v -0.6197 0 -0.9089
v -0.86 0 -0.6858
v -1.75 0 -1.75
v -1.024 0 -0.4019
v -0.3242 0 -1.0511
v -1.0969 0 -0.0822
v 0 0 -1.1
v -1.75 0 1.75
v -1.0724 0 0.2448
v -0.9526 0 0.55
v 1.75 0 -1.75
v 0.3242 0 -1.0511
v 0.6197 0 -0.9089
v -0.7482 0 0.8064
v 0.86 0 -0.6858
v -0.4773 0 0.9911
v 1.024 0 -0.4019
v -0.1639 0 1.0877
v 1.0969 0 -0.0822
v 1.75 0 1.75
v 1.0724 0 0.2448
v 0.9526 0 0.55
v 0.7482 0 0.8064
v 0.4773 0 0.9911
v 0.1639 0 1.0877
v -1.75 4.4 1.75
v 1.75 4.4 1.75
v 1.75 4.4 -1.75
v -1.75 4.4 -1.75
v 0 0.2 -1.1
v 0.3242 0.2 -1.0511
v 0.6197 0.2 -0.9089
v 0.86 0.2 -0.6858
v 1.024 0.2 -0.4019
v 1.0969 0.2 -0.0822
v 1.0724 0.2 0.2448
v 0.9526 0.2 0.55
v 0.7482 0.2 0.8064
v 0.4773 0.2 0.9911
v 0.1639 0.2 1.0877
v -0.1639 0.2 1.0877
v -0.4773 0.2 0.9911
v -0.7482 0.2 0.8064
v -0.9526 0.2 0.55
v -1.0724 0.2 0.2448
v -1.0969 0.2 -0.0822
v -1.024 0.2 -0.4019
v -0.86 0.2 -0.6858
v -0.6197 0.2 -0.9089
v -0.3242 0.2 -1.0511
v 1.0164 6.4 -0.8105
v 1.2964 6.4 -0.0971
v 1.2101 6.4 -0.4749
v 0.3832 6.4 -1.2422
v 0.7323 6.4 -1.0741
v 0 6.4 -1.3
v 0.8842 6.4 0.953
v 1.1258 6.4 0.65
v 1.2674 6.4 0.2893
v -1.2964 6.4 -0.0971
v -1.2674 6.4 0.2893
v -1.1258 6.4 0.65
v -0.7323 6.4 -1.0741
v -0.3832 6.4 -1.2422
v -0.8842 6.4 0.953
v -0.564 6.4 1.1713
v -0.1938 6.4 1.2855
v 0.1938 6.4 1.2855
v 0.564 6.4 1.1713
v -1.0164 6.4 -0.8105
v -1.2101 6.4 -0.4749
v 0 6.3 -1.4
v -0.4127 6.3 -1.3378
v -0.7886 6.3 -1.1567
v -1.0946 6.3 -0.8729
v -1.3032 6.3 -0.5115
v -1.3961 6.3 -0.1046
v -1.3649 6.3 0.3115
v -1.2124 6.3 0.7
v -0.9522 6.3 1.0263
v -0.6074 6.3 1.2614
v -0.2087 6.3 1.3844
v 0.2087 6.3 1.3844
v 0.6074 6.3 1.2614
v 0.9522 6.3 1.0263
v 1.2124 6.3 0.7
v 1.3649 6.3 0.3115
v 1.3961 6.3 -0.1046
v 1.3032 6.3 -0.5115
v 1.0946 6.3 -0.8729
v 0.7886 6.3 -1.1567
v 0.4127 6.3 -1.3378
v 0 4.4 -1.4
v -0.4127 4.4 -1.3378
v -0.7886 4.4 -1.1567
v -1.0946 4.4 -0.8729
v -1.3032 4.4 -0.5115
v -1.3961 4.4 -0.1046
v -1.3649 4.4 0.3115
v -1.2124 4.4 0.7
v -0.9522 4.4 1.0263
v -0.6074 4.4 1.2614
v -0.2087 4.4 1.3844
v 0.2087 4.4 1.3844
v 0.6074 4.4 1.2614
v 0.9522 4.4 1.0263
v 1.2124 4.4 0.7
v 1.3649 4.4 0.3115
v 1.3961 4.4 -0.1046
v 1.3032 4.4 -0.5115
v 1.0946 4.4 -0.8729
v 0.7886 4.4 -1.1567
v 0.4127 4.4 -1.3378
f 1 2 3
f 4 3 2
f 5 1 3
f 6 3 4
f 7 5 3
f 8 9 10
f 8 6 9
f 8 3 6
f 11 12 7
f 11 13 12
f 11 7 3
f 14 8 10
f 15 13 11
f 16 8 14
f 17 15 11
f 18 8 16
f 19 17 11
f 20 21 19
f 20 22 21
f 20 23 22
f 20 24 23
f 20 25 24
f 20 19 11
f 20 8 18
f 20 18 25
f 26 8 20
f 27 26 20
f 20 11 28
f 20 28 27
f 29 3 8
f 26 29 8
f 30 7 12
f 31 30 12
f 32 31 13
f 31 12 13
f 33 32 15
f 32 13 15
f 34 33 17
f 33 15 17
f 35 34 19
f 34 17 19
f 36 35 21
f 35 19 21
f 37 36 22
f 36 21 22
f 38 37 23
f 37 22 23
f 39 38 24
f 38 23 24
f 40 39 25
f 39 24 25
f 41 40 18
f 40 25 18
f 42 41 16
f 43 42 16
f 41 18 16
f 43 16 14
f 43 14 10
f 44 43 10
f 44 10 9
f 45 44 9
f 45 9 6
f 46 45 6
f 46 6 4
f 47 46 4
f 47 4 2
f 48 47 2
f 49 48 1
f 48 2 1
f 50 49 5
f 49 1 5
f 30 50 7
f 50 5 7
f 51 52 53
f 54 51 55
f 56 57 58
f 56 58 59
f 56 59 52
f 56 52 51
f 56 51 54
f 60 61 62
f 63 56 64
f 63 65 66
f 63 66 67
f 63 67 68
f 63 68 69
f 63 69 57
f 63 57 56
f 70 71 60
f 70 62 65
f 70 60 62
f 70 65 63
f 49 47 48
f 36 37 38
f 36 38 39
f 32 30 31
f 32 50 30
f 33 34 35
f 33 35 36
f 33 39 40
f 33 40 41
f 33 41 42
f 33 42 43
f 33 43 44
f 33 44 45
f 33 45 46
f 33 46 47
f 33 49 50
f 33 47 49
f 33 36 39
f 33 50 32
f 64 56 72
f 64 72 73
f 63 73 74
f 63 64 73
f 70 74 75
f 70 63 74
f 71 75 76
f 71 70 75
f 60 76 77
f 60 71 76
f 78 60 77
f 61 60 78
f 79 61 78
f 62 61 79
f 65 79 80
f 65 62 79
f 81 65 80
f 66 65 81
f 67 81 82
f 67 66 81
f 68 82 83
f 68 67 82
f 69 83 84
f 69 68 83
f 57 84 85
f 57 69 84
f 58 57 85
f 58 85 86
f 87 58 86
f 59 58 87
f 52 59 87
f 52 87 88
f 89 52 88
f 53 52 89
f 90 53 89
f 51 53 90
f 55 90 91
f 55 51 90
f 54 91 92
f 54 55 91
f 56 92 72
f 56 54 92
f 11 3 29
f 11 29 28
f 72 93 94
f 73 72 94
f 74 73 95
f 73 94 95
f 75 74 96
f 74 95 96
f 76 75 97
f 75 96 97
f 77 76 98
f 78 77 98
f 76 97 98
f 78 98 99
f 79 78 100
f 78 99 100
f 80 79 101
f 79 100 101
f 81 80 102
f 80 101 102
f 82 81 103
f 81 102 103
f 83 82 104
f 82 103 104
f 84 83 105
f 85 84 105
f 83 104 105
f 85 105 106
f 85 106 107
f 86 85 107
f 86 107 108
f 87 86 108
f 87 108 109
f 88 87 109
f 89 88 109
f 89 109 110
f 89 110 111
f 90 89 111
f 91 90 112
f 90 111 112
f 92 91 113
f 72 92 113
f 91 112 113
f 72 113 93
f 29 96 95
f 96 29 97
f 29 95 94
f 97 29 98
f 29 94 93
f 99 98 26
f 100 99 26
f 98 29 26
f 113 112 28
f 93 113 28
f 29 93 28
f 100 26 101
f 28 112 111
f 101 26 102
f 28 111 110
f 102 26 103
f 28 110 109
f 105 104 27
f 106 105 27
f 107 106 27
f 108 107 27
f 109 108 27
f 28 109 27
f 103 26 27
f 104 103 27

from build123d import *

# Parameters (mm, degrees)
SKETCH_1_W          = 3
SKETCH_1_H          = 3
EXTRUDE_1_DEPTH     = 4.4
SKETCH_2_R          = 1.4
EXTRUDE_2_DEPTH     = 2
SKETCH_3_R          = 1.1
CUT_EXTRUDE_1_DEPTH = 0.2
CHAMFER_1_SIZE      = 0.1
SKETCH_4_W          = 3.5
SKETCH_4_H          = 3.5
SKETCH_4_W_2        = 3
SKETCH_4_H_2        = 3
EXTRUDE_3_DEPTH     = 4.4


with BuildPart() as part:
    # 草图1 → 凸台-拉伸1 (new body)
    with BuildSketch(Plane(origin=(0, 0, 0), x_dir=(1, 0, 0), z_dir=(0, 1, 0))):
        Rectangle(SKETCH_1_W, SKETCH_1_H)
    extrude(amount=EXTRUDE_1_DEPTH)

    # 草图2 → 凸台-拉伸2 (add)
    with BuildSketch(Plane(origin=(0, 4.4, 0), x_dir=(1, 0, 0), z_dir=(0, 1, 0))):
        with Locations(Location((0, 0, 0), (0, 0, 90))):
            Circle(SKETCH_2_R)
    extrude(amount=EXTRUDE_2_DEPTH)

    # 草图3 → 切除-拉伸1 (cut)
    with BuildSketch(Plane.XZ):
        with Locations(Location((0, 0, 0), (0, 0, 270))):
            Circle(SKETCH_3_R)
    extrude(amount=-CUT_EXTRUDE_1_DEPTH, mode=Mode.SUBTRACT)

    # 倒角1
    chamfer_1_edges = [part.edges().sort_by_distance(p)[0] for p in [
        (0, 6.4, 1.4),
    ]]
    chamfer(chamfer_1_edges, length=CHAMFER_1_SIZE)

    # 草图4 → 凸台-拉伸3 (add)
    with BuildSketch(Plane.XZ):
        Rectangle(SKETCH_4_W, SKETCH_4_H)
        Rectangle(SKETCH_4_W_2, SKETCH_4_H_2, mode=Mode.SUBTRACT)
    extrude(amount=-EXTRUDE_3_DEPTH)


solid = part.part
